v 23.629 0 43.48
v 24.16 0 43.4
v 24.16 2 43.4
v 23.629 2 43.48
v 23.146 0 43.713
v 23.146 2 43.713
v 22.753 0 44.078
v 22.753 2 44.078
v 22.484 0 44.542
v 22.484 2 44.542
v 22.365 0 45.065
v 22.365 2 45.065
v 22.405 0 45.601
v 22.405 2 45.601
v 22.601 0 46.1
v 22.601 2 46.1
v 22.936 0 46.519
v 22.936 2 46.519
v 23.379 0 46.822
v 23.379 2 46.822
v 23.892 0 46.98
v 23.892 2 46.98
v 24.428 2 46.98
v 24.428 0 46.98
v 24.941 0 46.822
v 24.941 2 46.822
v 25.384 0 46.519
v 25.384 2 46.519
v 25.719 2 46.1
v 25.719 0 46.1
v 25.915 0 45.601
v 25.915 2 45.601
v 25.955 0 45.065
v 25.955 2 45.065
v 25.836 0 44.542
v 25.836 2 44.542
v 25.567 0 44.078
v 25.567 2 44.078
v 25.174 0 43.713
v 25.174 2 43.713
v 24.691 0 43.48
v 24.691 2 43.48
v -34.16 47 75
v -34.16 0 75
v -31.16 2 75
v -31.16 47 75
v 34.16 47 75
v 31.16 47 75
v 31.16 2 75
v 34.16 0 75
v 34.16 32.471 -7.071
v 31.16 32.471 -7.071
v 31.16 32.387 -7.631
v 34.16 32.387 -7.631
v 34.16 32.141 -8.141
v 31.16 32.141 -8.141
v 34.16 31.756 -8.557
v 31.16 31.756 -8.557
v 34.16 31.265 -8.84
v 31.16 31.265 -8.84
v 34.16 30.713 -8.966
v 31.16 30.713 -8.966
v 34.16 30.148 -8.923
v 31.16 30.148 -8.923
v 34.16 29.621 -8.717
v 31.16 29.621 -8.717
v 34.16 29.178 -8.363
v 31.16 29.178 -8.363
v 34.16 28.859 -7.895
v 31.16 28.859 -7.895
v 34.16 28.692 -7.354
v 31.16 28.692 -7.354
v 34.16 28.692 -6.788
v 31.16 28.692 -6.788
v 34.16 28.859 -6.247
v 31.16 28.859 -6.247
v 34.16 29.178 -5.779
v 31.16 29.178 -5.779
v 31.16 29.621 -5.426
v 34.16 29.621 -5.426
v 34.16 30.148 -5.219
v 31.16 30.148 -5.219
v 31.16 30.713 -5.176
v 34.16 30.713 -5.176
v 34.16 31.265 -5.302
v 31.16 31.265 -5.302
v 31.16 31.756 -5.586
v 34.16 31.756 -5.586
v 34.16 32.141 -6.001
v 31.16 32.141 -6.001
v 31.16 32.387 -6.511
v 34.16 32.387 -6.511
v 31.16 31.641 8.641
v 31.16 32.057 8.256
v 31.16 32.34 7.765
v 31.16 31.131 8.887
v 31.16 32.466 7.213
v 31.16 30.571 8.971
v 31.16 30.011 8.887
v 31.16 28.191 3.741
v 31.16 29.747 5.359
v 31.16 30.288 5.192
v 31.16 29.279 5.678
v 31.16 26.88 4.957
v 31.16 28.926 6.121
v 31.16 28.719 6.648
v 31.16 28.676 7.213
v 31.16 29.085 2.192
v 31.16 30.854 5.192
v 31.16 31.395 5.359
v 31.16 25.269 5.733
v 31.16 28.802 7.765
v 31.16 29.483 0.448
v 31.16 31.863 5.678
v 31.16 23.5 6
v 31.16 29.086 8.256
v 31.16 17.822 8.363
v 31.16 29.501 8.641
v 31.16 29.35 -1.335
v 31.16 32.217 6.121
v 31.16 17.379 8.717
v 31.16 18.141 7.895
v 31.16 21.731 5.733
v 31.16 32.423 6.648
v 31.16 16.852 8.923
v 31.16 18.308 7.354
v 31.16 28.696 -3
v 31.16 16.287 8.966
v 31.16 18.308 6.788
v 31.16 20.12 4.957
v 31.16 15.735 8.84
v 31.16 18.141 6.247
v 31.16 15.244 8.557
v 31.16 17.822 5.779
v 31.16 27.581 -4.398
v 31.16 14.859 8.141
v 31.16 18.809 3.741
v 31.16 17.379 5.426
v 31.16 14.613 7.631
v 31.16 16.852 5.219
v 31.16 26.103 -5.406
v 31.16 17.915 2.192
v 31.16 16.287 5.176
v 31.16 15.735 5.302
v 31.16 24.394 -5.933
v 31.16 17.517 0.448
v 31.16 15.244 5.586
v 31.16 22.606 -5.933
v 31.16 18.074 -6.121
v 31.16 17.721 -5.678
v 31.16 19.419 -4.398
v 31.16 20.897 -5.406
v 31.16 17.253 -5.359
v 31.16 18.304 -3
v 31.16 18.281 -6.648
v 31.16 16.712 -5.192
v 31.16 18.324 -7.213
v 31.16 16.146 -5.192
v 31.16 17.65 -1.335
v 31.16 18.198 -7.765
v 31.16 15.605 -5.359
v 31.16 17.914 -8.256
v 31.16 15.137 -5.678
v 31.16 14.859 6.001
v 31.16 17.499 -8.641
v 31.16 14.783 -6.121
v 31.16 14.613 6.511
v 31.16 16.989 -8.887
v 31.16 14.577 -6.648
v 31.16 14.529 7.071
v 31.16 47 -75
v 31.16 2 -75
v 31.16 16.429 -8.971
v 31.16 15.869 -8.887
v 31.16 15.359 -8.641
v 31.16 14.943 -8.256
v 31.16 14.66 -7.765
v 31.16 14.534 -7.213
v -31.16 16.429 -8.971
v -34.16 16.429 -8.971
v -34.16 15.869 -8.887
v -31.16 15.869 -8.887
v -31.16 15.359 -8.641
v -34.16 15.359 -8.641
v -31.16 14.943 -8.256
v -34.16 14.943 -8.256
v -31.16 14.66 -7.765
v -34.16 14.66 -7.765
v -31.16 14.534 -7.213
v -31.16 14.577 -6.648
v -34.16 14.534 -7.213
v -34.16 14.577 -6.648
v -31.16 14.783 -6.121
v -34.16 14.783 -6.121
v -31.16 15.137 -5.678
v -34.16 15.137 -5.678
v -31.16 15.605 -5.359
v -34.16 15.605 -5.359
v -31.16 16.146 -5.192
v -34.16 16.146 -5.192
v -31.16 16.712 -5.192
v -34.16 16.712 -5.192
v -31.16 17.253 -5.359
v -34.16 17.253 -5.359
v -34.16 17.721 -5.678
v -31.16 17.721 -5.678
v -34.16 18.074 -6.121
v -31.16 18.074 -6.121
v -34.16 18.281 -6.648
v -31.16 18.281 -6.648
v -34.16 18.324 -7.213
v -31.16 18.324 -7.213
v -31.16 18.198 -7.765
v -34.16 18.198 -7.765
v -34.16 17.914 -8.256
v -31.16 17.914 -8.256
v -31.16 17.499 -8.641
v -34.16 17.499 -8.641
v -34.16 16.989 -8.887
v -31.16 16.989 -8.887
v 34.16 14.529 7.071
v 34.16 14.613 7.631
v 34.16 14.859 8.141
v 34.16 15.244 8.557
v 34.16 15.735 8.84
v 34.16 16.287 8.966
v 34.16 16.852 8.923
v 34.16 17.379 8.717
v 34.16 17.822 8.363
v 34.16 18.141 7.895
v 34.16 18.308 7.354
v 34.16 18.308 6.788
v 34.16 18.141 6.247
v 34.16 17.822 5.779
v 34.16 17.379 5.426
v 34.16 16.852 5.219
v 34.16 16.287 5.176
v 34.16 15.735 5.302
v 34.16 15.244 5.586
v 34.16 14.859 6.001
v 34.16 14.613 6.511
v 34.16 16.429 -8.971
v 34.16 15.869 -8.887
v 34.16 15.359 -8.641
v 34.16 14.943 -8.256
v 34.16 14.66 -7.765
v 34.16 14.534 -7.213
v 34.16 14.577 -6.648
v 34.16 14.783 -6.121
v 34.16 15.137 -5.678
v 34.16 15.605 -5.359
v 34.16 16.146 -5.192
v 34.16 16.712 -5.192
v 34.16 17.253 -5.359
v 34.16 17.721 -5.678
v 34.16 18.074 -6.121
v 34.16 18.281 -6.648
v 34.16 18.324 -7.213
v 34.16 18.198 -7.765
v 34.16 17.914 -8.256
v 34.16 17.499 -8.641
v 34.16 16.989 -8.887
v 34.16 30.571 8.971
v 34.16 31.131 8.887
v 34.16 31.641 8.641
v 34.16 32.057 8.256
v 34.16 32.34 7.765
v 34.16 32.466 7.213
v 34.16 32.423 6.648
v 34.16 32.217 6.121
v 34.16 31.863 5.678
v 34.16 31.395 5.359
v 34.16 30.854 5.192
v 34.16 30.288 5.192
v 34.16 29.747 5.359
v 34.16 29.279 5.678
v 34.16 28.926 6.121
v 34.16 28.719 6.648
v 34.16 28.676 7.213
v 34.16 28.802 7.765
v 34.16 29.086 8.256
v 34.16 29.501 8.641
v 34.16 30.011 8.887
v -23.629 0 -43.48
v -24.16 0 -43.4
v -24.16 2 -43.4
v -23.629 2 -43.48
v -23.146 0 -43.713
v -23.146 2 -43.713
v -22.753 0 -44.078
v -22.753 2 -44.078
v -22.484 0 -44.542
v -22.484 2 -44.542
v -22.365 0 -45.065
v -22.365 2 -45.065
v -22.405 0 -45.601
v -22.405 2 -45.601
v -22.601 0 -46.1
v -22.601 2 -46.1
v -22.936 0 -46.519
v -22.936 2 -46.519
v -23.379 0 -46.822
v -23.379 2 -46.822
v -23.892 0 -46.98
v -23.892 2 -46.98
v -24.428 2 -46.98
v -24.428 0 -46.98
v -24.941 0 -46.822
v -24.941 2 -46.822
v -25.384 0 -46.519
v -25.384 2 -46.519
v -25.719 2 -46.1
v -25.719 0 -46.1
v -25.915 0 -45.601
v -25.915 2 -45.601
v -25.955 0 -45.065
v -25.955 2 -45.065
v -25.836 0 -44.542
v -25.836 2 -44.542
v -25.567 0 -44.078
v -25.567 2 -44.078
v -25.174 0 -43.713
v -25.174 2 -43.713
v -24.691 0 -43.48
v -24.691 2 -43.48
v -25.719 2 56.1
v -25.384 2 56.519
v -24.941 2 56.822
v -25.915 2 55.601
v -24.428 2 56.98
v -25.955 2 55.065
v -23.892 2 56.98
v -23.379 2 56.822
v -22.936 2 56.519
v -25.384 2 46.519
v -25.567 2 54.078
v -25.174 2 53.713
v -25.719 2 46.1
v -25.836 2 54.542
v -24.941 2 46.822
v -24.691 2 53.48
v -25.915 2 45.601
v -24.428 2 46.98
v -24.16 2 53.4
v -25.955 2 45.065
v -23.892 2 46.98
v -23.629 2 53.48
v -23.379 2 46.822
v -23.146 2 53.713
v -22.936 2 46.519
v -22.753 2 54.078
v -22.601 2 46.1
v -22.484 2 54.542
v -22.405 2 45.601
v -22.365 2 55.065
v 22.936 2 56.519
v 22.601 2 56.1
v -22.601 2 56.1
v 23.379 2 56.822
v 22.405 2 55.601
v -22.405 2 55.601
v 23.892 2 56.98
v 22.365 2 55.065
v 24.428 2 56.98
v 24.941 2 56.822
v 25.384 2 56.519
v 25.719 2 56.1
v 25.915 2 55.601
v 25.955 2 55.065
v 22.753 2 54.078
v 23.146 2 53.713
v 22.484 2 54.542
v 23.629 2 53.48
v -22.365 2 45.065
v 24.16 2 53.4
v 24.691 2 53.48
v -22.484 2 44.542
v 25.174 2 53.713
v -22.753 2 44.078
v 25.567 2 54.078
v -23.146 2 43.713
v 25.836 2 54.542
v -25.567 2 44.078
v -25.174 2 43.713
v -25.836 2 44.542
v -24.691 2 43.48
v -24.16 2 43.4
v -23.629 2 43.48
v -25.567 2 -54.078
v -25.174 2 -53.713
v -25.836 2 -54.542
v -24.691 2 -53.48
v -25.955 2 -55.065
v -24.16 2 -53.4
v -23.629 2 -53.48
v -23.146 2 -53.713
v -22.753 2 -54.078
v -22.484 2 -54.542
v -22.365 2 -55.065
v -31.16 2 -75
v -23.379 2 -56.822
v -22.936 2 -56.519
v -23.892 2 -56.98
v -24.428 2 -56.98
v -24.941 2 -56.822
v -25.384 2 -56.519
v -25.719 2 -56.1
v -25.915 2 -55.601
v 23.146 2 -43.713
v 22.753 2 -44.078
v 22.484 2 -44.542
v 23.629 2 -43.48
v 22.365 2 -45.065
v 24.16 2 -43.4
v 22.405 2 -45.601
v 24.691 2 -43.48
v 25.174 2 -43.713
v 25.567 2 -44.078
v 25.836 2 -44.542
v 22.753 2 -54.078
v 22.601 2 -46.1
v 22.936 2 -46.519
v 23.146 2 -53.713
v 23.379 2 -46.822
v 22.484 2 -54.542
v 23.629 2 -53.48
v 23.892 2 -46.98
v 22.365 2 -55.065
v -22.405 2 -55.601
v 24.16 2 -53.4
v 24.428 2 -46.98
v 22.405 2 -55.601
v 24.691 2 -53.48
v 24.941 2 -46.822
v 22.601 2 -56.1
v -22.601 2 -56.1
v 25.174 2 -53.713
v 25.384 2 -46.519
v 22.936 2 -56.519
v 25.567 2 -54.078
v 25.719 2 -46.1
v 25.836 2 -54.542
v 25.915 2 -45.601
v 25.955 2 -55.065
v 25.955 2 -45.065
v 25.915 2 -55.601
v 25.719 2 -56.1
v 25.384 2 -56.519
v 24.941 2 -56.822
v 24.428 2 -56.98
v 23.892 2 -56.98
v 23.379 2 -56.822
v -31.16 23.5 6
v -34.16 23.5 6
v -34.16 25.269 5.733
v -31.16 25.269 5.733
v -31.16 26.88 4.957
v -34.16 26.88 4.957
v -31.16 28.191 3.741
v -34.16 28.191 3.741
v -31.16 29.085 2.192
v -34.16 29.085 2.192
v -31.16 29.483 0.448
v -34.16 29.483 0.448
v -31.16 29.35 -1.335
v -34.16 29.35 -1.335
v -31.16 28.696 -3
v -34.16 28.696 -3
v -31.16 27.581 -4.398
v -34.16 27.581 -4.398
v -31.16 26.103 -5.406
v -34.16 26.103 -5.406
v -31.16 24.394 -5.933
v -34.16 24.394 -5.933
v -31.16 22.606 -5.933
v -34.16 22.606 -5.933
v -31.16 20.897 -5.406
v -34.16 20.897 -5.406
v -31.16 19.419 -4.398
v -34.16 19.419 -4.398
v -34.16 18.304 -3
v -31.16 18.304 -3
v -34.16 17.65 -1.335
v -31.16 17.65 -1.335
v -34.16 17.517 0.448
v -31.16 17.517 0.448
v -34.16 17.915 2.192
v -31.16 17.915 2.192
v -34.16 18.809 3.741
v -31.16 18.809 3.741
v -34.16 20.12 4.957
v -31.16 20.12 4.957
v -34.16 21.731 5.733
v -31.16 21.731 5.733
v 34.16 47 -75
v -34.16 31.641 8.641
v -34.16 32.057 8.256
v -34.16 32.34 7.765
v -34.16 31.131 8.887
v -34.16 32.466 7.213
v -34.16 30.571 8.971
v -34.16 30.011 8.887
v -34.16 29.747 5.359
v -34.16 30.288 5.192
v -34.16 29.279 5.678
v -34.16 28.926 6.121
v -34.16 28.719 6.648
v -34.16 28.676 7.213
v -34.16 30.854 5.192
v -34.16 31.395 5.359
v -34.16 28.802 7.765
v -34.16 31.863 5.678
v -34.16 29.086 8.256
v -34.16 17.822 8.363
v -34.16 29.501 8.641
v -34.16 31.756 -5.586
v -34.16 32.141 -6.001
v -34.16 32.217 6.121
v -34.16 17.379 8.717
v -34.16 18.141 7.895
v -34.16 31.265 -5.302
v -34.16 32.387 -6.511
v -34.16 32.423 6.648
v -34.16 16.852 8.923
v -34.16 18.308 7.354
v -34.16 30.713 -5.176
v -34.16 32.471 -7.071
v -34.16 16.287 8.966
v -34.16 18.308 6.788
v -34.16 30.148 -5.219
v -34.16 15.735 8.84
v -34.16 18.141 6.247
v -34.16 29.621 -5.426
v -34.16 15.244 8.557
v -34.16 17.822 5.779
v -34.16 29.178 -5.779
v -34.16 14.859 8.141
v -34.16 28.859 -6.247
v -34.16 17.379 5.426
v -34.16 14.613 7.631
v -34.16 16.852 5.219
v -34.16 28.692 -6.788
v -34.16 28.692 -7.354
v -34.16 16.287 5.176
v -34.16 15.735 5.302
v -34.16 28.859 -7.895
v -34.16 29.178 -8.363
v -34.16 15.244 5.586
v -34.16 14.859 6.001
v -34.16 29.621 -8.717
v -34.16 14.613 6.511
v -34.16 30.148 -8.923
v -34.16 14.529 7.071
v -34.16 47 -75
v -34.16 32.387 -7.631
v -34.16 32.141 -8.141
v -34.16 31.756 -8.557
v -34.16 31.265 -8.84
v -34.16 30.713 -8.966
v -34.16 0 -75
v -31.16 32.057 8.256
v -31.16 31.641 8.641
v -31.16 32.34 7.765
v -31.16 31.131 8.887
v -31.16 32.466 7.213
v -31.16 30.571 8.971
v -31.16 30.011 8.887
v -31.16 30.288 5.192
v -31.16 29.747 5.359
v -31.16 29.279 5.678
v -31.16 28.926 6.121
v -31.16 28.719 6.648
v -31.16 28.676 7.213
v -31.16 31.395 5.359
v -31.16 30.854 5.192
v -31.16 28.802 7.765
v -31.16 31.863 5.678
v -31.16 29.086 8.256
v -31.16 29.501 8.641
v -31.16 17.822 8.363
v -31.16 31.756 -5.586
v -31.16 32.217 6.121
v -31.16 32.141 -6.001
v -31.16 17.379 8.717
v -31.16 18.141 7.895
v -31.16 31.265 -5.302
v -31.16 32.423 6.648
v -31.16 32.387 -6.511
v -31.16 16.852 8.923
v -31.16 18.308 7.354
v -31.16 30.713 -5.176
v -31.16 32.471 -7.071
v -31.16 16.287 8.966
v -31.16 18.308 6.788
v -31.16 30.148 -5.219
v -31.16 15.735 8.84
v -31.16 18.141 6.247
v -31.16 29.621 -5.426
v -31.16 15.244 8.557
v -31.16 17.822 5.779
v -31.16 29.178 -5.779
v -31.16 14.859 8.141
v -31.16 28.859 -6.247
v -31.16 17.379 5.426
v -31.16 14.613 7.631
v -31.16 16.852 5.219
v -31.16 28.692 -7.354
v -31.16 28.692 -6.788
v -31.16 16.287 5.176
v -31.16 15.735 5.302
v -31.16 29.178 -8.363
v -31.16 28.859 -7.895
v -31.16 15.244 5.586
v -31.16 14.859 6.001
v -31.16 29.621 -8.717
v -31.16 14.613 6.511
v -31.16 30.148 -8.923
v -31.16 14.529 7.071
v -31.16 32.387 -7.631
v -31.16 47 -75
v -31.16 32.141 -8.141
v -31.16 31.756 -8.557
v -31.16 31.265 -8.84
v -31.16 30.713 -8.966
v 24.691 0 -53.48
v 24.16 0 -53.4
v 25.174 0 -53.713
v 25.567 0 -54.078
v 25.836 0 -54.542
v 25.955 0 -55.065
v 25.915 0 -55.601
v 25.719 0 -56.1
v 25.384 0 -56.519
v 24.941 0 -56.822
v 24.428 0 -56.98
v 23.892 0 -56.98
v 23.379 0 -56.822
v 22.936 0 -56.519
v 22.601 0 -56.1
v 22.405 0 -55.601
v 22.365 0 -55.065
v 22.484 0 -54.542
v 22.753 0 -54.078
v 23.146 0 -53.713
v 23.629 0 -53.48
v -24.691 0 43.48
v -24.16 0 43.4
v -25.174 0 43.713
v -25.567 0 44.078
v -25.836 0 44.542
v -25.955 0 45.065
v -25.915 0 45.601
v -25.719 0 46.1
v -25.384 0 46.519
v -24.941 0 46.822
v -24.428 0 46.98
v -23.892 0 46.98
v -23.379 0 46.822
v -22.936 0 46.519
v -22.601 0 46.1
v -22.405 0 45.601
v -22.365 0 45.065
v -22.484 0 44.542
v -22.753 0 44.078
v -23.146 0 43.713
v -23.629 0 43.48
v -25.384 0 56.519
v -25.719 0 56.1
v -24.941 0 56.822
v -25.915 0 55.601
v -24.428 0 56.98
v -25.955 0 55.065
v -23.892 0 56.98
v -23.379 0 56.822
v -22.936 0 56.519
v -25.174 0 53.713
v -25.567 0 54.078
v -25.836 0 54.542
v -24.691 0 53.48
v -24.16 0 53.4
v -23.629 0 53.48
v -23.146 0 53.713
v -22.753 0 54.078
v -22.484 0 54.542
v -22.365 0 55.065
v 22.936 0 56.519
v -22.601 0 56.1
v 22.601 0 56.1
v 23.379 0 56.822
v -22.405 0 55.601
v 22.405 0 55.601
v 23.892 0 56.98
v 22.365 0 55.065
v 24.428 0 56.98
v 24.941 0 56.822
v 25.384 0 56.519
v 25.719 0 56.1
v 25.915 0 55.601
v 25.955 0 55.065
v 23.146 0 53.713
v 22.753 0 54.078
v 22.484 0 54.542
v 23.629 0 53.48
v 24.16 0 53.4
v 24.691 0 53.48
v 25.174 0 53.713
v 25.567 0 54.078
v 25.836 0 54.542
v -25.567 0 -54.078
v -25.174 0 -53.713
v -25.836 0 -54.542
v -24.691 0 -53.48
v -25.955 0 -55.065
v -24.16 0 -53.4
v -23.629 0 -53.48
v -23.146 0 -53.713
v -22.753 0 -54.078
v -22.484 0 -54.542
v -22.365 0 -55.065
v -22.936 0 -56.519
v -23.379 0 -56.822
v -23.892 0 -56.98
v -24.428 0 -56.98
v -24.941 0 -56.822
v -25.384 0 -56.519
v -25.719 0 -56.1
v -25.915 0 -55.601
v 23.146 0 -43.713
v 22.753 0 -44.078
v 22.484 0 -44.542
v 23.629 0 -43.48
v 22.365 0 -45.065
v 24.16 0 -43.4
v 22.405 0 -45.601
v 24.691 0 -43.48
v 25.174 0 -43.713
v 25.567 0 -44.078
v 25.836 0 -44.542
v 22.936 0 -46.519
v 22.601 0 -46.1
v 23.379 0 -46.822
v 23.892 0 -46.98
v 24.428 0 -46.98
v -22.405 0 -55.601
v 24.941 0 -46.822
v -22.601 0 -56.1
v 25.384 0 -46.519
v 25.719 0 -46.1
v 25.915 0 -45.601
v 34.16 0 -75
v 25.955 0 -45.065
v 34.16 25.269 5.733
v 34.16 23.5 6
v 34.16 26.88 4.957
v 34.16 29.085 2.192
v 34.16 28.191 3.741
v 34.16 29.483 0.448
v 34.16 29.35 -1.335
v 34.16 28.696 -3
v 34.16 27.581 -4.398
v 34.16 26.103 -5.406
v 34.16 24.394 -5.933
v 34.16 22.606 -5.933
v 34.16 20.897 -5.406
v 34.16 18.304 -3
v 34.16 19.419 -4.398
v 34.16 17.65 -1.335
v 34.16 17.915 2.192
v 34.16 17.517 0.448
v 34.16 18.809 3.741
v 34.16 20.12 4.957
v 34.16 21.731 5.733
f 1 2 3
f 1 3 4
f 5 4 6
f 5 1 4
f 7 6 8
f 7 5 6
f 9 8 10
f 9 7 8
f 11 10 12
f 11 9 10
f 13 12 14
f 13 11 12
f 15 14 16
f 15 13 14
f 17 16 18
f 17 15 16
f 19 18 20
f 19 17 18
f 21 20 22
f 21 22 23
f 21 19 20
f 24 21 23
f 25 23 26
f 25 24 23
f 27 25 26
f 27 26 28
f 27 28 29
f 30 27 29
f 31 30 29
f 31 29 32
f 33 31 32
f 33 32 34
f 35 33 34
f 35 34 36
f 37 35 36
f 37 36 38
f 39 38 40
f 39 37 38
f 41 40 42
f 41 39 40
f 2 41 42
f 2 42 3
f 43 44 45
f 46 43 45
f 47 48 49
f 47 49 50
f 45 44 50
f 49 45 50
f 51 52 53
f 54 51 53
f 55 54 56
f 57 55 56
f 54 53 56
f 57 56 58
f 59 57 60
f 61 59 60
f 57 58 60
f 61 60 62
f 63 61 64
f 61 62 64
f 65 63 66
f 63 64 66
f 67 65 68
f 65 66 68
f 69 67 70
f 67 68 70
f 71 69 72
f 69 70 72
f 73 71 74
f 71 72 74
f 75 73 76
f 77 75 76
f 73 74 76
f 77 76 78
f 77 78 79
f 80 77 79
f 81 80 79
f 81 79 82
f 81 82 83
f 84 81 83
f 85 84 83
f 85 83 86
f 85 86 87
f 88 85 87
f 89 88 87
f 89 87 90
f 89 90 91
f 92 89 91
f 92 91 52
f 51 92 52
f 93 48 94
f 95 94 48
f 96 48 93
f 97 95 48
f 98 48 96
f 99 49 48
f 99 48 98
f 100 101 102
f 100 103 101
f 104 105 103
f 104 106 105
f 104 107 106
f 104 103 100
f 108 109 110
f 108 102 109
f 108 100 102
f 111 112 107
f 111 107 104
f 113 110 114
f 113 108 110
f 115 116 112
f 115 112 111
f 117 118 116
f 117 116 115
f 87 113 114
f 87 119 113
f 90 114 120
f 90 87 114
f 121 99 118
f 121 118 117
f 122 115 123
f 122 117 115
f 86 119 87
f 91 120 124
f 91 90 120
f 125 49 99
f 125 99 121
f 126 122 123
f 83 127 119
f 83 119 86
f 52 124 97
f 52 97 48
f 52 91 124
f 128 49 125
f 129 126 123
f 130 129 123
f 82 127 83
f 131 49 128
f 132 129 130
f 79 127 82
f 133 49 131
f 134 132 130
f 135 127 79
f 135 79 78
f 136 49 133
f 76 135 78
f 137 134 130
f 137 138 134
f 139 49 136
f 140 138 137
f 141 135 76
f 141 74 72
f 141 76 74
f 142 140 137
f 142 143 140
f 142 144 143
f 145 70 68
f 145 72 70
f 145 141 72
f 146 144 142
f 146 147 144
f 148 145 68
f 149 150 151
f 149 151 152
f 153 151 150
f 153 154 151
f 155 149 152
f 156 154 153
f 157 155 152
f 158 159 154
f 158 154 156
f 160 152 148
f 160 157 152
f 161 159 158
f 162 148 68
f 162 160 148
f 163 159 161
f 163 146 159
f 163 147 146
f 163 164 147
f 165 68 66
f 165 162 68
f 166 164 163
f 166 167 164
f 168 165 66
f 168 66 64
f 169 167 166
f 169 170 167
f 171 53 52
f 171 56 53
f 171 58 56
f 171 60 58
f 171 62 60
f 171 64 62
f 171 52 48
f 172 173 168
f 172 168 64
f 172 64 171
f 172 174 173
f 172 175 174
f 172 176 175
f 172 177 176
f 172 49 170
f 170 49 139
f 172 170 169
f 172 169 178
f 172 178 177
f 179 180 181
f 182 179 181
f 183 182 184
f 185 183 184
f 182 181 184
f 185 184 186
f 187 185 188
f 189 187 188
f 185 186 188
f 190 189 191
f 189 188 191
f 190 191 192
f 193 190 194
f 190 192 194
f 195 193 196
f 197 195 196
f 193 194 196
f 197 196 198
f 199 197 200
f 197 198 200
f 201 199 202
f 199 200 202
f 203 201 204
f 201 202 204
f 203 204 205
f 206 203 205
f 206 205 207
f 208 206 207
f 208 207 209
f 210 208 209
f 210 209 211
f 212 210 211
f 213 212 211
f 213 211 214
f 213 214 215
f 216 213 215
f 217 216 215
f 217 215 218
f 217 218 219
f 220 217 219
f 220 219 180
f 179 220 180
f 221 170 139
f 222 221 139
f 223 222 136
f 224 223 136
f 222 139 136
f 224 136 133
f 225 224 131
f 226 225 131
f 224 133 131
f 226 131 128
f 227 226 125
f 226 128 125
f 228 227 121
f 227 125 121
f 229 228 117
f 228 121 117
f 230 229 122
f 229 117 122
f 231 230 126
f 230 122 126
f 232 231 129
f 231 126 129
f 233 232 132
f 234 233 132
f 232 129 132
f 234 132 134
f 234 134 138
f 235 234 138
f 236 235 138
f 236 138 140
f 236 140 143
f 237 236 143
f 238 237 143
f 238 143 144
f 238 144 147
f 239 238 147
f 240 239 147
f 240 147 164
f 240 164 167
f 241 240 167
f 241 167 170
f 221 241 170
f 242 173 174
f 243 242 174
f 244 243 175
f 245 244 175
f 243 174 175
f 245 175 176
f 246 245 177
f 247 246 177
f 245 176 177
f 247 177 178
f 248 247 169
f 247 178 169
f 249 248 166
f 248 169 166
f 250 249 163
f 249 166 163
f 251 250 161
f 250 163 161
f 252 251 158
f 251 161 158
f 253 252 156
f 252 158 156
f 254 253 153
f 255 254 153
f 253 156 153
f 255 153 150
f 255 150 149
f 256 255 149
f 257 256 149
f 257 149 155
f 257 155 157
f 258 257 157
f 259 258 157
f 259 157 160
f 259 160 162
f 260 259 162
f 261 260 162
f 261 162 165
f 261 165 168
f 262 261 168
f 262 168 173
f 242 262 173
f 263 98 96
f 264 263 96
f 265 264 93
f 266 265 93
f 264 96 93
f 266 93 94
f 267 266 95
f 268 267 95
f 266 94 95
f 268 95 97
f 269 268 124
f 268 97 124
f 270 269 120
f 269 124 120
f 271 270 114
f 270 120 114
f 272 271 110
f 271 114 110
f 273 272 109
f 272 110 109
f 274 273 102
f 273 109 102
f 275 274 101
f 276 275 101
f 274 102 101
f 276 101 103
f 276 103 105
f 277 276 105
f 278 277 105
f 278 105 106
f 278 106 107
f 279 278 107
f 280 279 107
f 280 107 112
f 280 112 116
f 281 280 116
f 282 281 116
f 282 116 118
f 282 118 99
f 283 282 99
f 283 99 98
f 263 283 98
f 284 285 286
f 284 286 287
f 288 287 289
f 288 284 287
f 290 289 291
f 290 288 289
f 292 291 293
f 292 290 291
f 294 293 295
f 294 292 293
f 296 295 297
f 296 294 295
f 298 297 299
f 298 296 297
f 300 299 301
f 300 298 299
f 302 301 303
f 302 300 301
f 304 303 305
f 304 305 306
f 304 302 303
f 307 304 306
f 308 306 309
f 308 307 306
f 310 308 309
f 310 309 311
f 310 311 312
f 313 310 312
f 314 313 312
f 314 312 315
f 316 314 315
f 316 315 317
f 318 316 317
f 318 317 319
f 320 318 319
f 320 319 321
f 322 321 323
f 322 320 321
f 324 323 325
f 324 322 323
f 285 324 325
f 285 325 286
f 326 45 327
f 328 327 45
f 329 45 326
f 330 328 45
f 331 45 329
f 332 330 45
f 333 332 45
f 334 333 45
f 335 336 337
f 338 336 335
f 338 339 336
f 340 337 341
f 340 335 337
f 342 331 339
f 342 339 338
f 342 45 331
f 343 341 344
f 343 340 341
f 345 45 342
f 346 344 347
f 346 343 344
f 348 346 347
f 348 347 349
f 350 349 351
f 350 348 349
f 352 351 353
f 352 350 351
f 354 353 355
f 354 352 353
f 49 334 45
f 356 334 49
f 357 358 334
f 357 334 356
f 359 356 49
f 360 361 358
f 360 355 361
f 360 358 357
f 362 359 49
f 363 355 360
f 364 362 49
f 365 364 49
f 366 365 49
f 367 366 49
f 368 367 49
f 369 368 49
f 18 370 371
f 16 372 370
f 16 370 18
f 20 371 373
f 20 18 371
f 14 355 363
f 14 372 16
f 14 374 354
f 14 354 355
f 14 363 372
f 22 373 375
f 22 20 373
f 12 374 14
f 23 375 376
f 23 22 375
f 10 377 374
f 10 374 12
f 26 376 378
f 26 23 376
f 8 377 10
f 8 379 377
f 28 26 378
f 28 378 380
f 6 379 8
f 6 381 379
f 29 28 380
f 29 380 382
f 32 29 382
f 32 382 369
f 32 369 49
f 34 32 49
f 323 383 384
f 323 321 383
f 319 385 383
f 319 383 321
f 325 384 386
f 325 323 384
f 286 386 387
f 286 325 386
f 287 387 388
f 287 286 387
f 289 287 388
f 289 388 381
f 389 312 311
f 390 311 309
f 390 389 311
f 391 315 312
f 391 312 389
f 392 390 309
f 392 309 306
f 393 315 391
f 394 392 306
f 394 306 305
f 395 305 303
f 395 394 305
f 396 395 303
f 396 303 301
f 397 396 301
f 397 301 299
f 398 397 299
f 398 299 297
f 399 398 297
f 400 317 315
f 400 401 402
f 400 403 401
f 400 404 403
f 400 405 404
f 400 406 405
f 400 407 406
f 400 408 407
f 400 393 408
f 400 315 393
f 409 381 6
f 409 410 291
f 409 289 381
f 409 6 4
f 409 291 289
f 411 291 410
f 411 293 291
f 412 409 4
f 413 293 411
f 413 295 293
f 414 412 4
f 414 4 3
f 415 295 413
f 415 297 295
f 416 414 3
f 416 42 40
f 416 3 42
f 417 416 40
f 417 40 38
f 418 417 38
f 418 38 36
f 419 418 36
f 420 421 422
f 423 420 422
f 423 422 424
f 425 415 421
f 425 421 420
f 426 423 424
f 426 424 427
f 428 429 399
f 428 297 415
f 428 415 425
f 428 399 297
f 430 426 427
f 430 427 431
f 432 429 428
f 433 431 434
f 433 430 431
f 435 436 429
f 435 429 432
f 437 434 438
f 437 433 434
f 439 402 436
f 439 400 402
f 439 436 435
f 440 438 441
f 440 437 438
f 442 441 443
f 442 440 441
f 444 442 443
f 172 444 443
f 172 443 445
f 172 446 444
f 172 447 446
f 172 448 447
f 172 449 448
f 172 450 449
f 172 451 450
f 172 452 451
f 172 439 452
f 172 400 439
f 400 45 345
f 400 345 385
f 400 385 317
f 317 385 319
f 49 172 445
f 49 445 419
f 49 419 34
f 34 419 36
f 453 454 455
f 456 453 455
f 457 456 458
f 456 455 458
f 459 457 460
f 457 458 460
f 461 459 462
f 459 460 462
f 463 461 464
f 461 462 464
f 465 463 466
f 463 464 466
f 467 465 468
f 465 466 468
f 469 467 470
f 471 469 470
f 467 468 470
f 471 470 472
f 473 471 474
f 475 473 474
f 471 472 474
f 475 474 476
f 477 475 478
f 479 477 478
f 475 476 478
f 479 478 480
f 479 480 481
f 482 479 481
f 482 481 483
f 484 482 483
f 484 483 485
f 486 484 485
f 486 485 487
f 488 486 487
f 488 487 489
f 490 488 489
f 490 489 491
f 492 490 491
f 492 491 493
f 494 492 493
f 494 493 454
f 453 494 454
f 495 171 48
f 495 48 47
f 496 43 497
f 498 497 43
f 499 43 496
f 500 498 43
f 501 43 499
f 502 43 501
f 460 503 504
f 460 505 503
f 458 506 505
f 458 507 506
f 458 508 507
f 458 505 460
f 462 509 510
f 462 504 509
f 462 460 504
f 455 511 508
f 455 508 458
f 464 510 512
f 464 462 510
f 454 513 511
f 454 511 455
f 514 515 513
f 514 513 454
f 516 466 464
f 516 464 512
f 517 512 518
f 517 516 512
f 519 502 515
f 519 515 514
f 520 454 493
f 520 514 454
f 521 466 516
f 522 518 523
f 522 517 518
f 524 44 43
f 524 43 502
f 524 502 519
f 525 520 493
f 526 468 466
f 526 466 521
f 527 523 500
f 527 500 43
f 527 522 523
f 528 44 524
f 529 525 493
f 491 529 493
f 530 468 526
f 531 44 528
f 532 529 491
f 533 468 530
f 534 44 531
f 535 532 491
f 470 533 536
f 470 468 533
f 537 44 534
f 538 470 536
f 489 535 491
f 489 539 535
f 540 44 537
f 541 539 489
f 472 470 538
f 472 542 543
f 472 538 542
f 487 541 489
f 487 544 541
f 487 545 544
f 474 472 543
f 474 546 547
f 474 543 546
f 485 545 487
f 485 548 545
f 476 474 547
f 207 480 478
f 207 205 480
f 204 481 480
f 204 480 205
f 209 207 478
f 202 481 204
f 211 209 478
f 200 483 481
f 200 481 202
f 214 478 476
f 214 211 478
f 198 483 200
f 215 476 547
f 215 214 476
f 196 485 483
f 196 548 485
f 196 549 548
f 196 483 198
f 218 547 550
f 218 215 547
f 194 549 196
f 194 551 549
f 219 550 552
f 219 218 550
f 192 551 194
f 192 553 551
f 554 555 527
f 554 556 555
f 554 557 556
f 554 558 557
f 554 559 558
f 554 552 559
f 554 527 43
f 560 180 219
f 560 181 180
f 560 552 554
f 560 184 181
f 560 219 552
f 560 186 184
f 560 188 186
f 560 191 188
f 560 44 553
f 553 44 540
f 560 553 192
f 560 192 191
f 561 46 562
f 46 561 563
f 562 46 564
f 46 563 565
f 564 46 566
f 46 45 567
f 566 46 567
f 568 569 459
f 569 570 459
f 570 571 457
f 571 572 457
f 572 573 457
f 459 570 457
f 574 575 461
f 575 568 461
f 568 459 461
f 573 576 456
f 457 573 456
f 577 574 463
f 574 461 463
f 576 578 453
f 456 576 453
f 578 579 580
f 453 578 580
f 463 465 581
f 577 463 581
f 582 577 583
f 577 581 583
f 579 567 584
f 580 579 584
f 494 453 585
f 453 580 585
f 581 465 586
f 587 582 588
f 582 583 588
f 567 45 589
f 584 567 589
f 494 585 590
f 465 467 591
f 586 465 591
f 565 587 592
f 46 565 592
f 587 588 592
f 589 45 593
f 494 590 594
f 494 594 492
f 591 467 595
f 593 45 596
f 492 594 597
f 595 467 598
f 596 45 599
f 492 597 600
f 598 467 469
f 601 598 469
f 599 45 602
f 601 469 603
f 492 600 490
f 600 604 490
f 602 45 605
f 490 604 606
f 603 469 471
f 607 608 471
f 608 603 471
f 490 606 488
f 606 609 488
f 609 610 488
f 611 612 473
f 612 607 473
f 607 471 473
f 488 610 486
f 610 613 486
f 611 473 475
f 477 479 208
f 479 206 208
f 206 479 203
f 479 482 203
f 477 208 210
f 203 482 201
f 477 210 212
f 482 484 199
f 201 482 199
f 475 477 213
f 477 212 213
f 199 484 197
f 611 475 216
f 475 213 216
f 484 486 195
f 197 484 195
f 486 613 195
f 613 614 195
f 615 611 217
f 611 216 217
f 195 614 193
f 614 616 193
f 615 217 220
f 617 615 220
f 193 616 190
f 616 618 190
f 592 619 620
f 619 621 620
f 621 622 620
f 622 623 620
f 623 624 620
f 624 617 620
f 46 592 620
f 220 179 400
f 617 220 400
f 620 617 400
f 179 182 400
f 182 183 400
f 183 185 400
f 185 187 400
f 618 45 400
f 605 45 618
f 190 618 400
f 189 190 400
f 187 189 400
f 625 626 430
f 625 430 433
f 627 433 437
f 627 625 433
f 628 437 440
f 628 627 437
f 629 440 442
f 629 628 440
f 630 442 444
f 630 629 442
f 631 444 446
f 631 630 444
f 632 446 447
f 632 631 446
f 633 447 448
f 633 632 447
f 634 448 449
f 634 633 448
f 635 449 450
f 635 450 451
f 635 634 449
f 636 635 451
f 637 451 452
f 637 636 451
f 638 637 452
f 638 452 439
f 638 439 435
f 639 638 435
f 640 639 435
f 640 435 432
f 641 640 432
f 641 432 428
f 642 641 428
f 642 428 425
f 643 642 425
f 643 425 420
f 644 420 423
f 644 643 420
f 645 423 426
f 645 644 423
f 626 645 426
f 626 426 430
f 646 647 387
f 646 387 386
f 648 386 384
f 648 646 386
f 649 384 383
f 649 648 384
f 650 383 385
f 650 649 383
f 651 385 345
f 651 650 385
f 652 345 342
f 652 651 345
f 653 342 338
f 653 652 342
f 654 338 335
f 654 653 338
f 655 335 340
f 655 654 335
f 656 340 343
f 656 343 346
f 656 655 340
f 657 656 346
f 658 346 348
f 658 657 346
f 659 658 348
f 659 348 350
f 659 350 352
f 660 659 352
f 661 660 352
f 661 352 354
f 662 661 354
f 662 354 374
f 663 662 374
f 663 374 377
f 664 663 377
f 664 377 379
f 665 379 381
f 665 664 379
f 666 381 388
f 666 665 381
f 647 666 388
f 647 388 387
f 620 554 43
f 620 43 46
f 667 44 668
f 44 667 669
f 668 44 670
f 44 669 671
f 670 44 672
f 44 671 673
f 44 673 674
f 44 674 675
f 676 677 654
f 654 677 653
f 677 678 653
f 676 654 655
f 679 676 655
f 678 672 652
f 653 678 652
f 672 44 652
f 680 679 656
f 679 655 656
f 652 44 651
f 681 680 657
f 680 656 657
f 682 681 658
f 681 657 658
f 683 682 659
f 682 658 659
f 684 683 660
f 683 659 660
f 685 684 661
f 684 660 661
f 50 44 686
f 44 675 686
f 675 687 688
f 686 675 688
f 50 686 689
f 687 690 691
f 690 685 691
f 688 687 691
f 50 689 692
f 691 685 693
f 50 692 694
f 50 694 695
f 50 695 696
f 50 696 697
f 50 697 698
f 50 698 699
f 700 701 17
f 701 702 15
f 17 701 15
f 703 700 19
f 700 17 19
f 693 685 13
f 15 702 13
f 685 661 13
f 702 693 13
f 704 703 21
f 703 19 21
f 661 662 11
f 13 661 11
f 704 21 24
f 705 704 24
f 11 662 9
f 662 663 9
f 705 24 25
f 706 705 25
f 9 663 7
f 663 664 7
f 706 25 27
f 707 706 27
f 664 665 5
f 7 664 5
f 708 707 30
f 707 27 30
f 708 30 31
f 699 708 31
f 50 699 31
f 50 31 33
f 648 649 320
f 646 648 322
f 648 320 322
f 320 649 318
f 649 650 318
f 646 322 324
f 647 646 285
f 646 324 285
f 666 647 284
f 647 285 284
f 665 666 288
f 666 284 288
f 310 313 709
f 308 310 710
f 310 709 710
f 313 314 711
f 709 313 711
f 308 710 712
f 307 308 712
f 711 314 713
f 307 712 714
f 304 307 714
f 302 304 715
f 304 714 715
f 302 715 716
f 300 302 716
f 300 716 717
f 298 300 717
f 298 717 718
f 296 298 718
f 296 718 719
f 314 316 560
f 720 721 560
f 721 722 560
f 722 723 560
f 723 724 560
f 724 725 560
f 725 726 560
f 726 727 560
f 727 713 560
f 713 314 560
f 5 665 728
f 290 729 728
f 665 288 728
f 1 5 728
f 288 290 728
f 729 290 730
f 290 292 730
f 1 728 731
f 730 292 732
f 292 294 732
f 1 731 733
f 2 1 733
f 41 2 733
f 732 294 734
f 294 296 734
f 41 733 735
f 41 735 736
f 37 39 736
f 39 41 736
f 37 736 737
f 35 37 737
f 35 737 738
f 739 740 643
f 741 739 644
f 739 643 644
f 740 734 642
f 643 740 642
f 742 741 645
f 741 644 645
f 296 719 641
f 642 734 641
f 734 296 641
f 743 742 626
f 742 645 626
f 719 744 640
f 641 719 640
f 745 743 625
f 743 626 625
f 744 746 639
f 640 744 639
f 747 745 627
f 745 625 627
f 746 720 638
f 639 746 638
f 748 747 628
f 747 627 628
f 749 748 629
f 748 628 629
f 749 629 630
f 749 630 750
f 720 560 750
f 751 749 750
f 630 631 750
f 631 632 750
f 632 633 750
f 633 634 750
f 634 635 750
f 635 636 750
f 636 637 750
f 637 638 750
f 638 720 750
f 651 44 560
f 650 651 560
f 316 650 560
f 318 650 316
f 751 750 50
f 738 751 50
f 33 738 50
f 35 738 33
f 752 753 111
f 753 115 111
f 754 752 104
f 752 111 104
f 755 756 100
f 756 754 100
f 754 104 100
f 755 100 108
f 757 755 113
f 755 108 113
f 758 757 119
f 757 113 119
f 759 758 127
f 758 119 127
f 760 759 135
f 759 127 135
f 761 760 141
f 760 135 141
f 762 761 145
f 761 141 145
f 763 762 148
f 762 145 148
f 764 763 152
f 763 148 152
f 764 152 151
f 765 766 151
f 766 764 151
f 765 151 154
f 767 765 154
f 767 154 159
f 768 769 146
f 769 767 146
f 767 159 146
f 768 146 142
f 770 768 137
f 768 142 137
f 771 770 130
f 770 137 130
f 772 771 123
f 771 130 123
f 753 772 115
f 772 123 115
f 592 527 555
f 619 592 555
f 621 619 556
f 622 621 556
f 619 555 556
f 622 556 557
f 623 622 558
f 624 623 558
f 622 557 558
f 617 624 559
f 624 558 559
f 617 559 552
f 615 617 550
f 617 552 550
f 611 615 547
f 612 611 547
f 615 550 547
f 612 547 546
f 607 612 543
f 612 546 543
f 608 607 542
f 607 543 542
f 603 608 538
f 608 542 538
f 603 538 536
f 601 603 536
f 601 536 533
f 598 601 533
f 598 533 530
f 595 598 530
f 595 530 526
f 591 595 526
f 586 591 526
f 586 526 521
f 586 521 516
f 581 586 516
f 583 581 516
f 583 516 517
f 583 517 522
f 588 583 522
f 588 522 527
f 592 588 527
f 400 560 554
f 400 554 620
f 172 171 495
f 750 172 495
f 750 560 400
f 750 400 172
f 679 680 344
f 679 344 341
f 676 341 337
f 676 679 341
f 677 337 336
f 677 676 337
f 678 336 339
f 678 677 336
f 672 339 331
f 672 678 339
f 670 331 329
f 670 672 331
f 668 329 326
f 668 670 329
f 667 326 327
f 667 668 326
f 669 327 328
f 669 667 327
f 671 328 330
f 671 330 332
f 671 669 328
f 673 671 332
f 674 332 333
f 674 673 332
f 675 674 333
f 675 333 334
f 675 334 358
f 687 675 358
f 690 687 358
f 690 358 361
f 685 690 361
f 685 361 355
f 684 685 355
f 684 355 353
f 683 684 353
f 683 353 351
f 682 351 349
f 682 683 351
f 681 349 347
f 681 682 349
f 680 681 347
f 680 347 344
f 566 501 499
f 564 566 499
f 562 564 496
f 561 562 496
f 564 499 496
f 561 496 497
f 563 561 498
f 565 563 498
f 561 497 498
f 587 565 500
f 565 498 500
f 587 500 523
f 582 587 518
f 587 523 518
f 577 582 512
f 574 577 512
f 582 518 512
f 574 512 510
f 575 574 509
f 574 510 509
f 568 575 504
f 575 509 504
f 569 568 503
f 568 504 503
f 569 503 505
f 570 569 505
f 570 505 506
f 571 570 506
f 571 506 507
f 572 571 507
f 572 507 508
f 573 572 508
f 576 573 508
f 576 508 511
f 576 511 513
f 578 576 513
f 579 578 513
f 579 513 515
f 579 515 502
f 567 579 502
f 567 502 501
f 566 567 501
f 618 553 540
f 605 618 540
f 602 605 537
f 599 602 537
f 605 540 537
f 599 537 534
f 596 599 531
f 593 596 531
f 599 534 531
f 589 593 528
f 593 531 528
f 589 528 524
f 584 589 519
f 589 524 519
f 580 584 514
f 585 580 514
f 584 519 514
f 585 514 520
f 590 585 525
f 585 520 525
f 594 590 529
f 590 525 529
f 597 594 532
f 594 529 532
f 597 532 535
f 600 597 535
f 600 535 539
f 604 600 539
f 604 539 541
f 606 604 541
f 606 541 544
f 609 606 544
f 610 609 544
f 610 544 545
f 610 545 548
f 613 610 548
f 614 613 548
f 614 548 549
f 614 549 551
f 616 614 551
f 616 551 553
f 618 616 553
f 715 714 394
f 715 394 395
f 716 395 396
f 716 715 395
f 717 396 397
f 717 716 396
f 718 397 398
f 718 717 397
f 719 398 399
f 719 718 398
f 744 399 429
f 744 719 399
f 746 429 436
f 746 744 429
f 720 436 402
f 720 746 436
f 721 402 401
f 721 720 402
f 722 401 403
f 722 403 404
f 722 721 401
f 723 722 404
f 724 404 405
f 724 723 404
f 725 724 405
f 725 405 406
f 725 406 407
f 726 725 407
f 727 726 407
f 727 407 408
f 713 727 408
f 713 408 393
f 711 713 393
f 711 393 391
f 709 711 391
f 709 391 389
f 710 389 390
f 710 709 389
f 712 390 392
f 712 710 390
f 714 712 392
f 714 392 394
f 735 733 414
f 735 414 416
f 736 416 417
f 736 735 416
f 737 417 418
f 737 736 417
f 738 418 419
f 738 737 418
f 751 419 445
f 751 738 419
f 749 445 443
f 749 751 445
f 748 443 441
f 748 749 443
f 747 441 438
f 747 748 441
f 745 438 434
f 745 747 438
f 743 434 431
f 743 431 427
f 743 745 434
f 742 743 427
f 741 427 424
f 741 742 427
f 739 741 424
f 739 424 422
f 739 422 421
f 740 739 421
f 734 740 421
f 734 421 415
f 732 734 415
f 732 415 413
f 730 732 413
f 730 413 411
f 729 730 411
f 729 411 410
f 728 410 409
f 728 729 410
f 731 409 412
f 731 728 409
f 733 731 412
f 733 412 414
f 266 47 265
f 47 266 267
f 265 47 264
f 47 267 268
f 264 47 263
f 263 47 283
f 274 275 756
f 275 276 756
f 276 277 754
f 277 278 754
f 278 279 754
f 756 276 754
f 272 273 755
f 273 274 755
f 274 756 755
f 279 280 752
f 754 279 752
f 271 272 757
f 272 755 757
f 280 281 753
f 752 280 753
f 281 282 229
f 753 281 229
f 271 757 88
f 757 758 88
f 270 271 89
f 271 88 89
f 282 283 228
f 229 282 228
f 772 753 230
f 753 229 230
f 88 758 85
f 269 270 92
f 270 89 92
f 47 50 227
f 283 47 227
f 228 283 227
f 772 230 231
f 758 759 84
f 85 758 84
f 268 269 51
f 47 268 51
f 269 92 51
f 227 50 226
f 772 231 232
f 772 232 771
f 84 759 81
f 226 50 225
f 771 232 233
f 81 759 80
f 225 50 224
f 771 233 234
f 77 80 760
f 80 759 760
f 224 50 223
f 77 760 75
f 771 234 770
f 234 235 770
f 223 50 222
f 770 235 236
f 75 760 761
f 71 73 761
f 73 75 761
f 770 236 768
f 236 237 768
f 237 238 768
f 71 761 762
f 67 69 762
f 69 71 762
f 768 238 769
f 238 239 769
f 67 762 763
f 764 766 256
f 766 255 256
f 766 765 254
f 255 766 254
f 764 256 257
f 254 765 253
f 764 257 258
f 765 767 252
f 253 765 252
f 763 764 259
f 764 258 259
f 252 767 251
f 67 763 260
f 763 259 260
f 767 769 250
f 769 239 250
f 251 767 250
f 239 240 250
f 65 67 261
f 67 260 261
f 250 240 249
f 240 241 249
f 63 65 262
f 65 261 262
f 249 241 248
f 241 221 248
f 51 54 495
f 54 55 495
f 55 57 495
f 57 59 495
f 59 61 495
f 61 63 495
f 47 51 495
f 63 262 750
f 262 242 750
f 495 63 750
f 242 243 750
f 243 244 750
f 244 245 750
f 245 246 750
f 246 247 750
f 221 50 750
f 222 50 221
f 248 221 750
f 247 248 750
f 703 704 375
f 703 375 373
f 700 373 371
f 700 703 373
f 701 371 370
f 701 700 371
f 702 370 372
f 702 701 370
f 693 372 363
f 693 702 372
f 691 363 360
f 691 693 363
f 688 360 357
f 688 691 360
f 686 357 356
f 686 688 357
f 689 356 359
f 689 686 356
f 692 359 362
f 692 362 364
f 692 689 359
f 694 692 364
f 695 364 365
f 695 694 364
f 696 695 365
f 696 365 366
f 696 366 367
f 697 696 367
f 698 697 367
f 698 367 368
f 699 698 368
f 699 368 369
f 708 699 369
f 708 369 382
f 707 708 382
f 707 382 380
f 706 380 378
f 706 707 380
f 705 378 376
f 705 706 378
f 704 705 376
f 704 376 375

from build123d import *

# Parameters (mm, degrees)
CROQUIS1_W              = 68.32
CROQUIS1_H              = 150
CROQUIS1_R              = 1.8
SALIENTE_EXTRUIR1_DEPTH = 2
CROQUIS2_W              = 3
CROQUIS2_H              = 150
SALIENTE_EXTRUIR2_DEPTH = 45
CROQUIS3_W              = 3
CROQUIS3_H              = 150
SALIENTE_EXTRUIR3_DEPTH = 45
CROQUIS4_R              = 6
CROQUIS4_R_2            = 1.9
CORTAR_EXTRUIR1_DEPTH   = 112.810654233
MATRIZC1_COUNT          = 4


with BuildPart() as part:
    # Croquis1 → Saliente-Extruir1 (new body)
    with BuildSketch(Plane(origin=(0, 0, 0), x_dir=(1, 0, 0), z_dir=(0, 1, 0))):
        Rectangle(CROQUIS1_W, CROQUIS1_H)
        with Locations(Location((24.16, 45.2, 0), (0, 0, 270))):
            Circle(CROQUIS1_R, mode=Mode.SUBTRACT)
        with Locations(Location((24.16, 55.2, 0), (0, 0, 270))):
            Circle(CROQUIS1_R, mode=Mode.SUBTRACT)
        with Locations(Location((-24.16, -55.2, 0), (0, 0, 90))):
            Circle(CROQUIS1_R, mode=Mode.SUBTRACT)
        with Locations(Location((24.16, -55.2, 0), (0, 0, 90))):
            Circle(CROQUIS1_R, mode=Mode.SUBTRACT)
        with Locations(Location((-24.16, 45.2, 0), (0, 0, 270))):
            Circle(CROQUIS1_R, mode=Mode.SUBTRACT)
        with Locations(Location((-24.16, 55.2, 0), (0, 0, 270))):
            Circle(CROQUIS1_R, mode=Mode.SUBTRACT)
        with Locations(Location((-24.16, -45.2, 0), (0, 0, 90))):
            Circle(CROQUIS1_R, mode=Mode.SUBTRACT)
        with Locations(Location((24.16, -45.2, 0), (0, 0, 90))):
            Circle(CROQUIS1_R, mode=Mode.SUBTRACT)
    extrude(amount=SALIENTE_EXTRUIR1_DEPTH)

    # Croquis2 → Saliente-Extruir2 (add)
    with BuildSketch(Plane(origin=(0, 2, 0), x_dir=(1, 0, 0), z_dir=(0, 1, 0))):
        with Locations((-32.66, 0)):
            Rectangle(CROQUIS2_W, CROQUIS2_H)
    extrude(amount=SALIENTE_EXTRUIR2_DEPTH)

    # Croquis3 → Saliente-Extruir3 (add)
    with BuildSketch(Plane(origin=(0, 2, 0), x_dir=(1, 0, 0), z_dir=(0, 1, 0))):
        with Locations((32.66, 0)):
            Rectangle(CROQUIS3_W, CROQUIS3_H)
    extrude(amount=SALIENTE_EXTRUIR3_DEPTH)

    # Croquis4 → Cortar-Extruir1 (cut, through all)
    with BuildSketch(Plane.ZY.offset(34.16)):
        with Locations((0, 23.5)):
            Circle(CROQUIS4_R)
        with Locations((7.071067812, 30.571067812)):
            Circle(CROQUIS4_R_2)
    cortar_extruir1 = extrude(amount=-CORTAR_EXTRUIR1_DEPTH, mode=Mode.SUBTRACT)

    # MatrizC1: Cortar-Extruir1 ×4 about axis
    matrizc1_axis = Axis((0, 23.5, 0), (1, 0, 0))
    for i in range(1, MATRIZC1_COUNT):
        add(cortar_extruir1.rotate(matrizc1_axis, i * 360 / MATRIZC1_COUNT), mode=Mode.SUBTRACT)


solid = part.part
